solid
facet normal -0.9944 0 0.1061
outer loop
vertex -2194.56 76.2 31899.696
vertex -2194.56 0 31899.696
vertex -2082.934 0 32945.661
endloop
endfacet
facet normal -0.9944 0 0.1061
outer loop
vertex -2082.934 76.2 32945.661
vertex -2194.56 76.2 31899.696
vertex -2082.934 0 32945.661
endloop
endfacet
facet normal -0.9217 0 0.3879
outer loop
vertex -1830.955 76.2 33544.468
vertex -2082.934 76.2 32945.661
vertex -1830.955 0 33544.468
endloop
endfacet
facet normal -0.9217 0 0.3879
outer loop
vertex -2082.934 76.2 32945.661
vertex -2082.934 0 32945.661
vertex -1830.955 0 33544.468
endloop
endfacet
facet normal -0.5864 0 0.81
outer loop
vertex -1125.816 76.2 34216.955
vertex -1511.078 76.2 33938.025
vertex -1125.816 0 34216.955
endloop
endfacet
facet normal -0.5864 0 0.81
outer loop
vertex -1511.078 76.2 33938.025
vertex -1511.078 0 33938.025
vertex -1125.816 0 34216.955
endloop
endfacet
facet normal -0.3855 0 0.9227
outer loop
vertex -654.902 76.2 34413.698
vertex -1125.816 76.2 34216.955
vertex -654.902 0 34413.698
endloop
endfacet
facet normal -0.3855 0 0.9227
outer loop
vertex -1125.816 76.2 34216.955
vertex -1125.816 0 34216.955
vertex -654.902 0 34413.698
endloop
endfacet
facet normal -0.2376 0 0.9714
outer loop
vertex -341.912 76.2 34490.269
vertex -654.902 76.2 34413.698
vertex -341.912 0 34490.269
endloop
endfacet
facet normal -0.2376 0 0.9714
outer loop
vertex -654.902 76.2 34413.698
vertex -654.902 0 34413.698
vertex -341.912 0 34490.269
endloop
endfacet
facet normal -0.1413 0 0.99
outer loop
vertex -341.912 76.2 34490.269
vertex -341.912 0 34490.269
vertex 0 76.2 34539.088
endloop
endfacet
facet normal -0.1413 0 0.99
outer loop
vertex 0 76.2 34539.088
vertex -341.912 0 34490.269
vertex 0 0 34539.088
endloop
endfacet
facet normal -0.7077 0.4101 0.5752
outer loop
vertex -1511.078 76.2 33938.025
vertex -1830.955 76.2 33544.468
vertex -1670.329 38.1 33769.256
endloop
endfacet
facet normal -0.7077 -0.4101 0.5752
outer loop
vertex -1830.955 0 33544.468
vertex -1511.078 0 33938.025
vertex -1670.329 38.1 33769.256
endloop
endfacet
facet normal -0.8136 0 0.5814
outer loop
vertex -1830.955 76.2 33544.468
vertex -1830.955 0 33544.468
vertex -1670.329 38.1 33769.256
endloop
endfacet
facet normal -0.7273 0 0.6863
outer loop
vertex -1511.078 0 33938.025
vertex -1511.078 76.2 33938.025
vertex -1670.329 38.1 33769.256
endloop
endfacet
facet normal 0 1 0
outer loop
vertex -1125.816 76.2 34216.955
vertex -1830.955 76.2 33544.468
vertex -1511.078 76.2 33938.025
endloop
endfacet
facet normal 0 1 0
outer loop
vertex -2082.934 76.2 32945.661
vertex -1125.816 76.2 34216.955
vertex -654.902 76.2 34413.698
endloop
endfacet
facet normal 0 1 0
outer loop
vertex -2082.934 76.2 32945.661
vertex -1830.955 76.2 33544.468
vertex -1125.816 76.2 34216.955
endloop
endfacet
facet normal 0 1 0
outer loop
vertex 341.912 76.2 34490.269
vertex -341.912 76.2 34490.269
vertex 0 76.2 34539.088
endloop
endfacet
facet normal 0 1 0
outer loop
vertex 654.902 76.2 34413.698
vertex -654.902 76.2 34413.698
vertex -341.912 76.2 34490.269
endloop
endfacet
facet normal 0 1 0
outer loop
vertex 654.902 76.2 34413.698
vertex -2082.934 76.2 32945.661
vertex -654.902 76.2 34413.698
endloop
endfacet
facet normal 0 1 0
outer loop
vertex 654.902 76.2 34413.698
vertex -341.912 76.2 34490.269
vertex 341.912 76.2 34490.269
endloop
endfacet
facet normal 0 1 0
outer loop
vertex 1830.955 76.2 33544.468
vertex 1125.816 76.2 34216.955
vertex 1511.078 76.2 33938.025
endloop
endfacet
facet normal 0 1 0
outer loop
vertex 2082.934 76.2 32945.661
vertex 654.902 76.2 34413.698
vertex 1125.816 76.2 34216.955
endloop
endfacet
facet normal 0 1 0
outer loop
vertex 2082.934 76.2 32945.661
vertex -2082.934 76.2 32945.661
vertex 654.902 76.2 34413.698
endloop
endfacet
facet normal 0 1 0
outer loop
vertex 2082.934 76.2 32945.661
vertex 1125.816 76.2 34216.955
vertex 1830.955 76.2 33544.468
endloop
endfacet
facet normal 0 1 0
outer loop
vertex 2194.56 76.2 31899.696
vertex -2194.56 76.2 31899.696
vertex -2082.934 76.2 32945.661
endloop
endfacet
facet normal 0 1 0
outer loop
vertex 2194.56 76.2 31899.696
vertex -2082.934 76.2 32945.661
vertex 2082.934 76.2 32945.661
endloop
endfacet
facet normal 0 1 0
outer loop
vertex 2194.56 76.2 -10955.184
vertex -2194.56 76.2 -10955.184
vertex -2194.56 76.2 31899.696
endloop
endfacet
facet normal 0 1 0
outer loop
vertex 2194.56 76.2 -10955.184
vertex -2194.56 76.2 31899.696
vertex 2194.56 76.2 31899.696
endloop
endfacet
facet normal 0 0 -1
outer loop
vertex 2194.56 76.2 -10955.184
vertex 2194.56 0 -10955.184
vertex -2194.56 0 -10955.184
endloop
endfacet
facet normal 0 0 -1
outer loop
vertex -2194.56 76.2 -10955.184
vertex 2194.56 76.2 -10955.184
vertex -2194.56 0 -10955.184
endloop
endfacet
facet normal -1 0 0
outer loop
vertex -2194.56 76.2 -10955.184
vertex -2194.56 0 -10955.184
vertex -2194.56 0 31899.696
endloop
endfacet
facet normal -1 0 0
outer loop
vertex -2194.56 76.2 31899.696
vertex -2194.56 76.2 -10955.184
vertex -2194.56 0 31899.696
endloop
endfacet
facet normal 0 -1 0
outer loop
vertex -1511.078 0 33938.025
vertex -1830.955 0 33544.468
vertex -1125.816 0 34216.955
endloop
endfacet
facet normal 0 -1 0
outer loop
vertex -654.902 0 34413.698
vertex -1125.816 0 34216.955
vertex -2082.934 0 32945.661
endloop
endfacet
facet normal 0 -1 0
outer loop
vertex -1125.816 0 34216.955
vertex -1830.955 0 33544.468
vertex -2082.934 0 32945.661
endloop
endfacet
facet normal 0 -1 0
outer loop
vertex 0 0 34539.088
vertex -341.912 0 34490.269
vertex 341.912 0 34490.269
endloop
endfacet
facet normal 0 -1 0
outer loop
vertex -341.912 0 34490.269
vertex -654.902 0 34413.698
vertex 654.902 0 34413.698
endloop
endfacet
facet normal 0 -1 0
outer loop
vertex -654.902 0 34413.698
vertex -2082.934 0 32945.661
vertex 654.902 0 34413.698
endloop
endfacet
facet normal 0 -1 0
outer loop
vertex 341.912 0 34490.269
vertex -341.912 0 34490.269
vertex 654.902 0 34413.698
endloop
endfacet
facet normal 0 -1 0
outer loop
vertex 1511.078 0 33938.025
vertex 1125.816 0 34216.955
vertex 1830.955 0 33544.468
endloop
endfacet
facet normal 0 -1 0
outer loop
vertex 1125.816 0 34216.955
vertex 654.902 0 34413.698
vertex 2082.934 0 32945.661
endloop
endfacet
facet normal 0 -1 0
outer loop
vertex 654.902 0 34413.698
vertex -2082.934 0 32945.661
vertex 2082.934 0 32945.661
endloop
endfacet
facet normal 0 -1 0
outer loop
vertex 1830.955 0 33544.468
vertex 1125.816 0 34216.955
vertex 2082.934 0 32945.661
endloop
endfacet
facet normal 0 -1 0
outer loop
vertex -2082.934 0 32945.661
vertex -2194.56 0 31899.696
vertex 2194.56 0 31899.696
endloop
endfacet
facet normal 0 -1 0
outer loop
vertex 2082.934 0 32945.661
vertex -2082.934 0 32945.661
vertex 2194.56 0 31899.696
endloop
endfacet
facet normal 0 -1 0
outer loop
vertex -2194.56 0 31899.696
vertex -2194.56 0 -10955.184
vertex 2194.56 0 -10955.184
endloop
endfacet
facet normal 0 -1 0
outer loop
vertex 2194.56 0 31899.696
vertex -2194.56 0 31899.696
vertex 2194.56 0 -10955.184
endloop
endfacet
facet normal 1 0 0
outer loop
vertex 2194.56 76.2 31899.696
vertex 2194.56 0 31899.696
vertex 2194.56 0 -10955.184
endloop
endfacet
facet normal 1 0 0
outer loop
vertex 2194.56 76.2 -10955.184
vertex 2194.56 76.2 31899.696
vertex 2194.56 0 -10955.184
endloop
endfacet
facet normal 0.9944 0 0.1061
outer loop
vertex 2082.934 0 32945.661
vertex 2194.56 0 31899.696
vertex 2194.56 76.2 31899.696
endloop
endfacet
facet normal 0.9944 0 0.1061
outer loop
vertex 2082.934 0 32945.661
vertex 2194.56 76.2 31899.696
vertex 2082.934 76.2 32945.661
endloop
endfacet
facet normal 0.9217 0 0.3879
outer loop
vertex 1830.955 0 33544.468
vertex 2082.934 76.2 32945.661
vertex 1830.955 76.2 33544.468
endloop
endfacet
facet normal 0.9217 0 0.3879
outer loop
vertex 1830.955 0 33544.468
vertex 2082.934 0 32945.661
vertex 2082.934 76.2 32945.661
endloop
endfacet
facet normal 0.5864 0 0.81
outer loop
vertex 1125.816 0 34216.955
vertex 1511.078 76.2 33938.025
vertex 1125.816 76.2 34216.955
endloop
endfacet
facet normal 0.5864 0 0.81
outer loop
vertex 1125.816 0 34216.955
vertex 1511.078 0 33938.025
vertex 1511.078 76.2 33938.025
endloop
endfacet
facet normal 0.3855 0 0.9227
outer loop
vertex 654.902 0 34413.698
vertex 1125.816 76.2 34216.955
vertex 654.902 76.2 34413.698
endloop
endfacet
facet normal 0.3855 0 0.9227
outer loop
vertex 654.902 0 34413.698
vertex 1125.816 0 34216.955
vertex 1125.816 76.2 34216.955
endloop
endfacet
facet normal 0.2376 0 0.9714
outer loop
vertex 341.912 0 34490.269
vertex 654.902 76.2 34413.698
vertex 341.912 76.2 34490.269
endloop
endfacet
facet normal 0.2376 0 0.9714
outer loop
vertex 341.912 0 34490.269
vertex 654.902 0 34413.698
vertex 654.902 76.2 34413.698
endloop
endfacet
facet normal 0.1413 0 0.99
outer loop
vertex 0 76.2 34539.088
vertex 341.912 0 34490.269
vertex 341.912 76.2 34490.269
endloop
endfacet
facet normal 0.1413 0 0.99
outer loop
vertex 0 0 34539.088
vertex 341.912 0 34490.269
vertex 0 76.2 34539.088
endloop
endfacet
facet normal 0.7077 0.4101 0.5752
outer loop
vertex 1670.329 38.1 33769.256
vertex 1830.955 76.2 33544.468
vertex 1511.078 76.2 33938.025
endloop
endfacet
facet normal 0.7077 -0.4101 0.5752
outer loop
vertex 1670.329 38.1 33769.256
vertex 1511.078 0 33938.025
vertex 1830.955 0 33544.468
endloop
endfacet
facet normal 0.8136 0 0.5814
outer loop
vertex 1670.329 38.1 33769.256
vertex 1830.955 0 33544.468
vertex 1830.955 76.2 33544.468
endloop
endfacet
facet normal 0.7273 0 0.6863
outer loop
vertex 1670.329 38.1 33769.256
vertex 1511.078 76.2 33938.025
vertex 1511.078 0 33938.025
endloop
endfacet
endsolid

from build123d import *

# Parameters (mm, degrees)
BOSS_EXTRUDE1_DEPTH = 76.2


with BuildPart() as part:
    # Sketch4 → Boss-Extrude1 (new body)
    with BuildSketch(Plane(origin=(0, 0, 0), x_dir=(1, 0, 0), z_dir=(0, 1, 0))):
        with BuildLine():
            Line((-2194.56, 10955.184212568), (-2194.56, -31899.695787432))
            add(Edge.make_bspline(
                [(-2194.56, -31899.695787432), (-2243.378707841, -34319.120962753), (0, -34539.087894)],
                knots=[0, 0, 0, 1, 1, 1], degree=2))
            add(Edge.make_bspline(
                [(2194.56, -31899.695787432), (2243.378707841, -34319.120962753), (0, -34539.087894)],
                knots=[0, 0, 0, 1, 1, 1], degree=2))
            Line((2194.56, -31899.695787432), (2194.56, 10955.184212568))
            Line((2194.56, 10955.184212568), (-2194.56, 10955.184212568))
        make_face()
    extrude(amount=BOSS_EXTRUDE1_DEPTH)


solid = part.part
